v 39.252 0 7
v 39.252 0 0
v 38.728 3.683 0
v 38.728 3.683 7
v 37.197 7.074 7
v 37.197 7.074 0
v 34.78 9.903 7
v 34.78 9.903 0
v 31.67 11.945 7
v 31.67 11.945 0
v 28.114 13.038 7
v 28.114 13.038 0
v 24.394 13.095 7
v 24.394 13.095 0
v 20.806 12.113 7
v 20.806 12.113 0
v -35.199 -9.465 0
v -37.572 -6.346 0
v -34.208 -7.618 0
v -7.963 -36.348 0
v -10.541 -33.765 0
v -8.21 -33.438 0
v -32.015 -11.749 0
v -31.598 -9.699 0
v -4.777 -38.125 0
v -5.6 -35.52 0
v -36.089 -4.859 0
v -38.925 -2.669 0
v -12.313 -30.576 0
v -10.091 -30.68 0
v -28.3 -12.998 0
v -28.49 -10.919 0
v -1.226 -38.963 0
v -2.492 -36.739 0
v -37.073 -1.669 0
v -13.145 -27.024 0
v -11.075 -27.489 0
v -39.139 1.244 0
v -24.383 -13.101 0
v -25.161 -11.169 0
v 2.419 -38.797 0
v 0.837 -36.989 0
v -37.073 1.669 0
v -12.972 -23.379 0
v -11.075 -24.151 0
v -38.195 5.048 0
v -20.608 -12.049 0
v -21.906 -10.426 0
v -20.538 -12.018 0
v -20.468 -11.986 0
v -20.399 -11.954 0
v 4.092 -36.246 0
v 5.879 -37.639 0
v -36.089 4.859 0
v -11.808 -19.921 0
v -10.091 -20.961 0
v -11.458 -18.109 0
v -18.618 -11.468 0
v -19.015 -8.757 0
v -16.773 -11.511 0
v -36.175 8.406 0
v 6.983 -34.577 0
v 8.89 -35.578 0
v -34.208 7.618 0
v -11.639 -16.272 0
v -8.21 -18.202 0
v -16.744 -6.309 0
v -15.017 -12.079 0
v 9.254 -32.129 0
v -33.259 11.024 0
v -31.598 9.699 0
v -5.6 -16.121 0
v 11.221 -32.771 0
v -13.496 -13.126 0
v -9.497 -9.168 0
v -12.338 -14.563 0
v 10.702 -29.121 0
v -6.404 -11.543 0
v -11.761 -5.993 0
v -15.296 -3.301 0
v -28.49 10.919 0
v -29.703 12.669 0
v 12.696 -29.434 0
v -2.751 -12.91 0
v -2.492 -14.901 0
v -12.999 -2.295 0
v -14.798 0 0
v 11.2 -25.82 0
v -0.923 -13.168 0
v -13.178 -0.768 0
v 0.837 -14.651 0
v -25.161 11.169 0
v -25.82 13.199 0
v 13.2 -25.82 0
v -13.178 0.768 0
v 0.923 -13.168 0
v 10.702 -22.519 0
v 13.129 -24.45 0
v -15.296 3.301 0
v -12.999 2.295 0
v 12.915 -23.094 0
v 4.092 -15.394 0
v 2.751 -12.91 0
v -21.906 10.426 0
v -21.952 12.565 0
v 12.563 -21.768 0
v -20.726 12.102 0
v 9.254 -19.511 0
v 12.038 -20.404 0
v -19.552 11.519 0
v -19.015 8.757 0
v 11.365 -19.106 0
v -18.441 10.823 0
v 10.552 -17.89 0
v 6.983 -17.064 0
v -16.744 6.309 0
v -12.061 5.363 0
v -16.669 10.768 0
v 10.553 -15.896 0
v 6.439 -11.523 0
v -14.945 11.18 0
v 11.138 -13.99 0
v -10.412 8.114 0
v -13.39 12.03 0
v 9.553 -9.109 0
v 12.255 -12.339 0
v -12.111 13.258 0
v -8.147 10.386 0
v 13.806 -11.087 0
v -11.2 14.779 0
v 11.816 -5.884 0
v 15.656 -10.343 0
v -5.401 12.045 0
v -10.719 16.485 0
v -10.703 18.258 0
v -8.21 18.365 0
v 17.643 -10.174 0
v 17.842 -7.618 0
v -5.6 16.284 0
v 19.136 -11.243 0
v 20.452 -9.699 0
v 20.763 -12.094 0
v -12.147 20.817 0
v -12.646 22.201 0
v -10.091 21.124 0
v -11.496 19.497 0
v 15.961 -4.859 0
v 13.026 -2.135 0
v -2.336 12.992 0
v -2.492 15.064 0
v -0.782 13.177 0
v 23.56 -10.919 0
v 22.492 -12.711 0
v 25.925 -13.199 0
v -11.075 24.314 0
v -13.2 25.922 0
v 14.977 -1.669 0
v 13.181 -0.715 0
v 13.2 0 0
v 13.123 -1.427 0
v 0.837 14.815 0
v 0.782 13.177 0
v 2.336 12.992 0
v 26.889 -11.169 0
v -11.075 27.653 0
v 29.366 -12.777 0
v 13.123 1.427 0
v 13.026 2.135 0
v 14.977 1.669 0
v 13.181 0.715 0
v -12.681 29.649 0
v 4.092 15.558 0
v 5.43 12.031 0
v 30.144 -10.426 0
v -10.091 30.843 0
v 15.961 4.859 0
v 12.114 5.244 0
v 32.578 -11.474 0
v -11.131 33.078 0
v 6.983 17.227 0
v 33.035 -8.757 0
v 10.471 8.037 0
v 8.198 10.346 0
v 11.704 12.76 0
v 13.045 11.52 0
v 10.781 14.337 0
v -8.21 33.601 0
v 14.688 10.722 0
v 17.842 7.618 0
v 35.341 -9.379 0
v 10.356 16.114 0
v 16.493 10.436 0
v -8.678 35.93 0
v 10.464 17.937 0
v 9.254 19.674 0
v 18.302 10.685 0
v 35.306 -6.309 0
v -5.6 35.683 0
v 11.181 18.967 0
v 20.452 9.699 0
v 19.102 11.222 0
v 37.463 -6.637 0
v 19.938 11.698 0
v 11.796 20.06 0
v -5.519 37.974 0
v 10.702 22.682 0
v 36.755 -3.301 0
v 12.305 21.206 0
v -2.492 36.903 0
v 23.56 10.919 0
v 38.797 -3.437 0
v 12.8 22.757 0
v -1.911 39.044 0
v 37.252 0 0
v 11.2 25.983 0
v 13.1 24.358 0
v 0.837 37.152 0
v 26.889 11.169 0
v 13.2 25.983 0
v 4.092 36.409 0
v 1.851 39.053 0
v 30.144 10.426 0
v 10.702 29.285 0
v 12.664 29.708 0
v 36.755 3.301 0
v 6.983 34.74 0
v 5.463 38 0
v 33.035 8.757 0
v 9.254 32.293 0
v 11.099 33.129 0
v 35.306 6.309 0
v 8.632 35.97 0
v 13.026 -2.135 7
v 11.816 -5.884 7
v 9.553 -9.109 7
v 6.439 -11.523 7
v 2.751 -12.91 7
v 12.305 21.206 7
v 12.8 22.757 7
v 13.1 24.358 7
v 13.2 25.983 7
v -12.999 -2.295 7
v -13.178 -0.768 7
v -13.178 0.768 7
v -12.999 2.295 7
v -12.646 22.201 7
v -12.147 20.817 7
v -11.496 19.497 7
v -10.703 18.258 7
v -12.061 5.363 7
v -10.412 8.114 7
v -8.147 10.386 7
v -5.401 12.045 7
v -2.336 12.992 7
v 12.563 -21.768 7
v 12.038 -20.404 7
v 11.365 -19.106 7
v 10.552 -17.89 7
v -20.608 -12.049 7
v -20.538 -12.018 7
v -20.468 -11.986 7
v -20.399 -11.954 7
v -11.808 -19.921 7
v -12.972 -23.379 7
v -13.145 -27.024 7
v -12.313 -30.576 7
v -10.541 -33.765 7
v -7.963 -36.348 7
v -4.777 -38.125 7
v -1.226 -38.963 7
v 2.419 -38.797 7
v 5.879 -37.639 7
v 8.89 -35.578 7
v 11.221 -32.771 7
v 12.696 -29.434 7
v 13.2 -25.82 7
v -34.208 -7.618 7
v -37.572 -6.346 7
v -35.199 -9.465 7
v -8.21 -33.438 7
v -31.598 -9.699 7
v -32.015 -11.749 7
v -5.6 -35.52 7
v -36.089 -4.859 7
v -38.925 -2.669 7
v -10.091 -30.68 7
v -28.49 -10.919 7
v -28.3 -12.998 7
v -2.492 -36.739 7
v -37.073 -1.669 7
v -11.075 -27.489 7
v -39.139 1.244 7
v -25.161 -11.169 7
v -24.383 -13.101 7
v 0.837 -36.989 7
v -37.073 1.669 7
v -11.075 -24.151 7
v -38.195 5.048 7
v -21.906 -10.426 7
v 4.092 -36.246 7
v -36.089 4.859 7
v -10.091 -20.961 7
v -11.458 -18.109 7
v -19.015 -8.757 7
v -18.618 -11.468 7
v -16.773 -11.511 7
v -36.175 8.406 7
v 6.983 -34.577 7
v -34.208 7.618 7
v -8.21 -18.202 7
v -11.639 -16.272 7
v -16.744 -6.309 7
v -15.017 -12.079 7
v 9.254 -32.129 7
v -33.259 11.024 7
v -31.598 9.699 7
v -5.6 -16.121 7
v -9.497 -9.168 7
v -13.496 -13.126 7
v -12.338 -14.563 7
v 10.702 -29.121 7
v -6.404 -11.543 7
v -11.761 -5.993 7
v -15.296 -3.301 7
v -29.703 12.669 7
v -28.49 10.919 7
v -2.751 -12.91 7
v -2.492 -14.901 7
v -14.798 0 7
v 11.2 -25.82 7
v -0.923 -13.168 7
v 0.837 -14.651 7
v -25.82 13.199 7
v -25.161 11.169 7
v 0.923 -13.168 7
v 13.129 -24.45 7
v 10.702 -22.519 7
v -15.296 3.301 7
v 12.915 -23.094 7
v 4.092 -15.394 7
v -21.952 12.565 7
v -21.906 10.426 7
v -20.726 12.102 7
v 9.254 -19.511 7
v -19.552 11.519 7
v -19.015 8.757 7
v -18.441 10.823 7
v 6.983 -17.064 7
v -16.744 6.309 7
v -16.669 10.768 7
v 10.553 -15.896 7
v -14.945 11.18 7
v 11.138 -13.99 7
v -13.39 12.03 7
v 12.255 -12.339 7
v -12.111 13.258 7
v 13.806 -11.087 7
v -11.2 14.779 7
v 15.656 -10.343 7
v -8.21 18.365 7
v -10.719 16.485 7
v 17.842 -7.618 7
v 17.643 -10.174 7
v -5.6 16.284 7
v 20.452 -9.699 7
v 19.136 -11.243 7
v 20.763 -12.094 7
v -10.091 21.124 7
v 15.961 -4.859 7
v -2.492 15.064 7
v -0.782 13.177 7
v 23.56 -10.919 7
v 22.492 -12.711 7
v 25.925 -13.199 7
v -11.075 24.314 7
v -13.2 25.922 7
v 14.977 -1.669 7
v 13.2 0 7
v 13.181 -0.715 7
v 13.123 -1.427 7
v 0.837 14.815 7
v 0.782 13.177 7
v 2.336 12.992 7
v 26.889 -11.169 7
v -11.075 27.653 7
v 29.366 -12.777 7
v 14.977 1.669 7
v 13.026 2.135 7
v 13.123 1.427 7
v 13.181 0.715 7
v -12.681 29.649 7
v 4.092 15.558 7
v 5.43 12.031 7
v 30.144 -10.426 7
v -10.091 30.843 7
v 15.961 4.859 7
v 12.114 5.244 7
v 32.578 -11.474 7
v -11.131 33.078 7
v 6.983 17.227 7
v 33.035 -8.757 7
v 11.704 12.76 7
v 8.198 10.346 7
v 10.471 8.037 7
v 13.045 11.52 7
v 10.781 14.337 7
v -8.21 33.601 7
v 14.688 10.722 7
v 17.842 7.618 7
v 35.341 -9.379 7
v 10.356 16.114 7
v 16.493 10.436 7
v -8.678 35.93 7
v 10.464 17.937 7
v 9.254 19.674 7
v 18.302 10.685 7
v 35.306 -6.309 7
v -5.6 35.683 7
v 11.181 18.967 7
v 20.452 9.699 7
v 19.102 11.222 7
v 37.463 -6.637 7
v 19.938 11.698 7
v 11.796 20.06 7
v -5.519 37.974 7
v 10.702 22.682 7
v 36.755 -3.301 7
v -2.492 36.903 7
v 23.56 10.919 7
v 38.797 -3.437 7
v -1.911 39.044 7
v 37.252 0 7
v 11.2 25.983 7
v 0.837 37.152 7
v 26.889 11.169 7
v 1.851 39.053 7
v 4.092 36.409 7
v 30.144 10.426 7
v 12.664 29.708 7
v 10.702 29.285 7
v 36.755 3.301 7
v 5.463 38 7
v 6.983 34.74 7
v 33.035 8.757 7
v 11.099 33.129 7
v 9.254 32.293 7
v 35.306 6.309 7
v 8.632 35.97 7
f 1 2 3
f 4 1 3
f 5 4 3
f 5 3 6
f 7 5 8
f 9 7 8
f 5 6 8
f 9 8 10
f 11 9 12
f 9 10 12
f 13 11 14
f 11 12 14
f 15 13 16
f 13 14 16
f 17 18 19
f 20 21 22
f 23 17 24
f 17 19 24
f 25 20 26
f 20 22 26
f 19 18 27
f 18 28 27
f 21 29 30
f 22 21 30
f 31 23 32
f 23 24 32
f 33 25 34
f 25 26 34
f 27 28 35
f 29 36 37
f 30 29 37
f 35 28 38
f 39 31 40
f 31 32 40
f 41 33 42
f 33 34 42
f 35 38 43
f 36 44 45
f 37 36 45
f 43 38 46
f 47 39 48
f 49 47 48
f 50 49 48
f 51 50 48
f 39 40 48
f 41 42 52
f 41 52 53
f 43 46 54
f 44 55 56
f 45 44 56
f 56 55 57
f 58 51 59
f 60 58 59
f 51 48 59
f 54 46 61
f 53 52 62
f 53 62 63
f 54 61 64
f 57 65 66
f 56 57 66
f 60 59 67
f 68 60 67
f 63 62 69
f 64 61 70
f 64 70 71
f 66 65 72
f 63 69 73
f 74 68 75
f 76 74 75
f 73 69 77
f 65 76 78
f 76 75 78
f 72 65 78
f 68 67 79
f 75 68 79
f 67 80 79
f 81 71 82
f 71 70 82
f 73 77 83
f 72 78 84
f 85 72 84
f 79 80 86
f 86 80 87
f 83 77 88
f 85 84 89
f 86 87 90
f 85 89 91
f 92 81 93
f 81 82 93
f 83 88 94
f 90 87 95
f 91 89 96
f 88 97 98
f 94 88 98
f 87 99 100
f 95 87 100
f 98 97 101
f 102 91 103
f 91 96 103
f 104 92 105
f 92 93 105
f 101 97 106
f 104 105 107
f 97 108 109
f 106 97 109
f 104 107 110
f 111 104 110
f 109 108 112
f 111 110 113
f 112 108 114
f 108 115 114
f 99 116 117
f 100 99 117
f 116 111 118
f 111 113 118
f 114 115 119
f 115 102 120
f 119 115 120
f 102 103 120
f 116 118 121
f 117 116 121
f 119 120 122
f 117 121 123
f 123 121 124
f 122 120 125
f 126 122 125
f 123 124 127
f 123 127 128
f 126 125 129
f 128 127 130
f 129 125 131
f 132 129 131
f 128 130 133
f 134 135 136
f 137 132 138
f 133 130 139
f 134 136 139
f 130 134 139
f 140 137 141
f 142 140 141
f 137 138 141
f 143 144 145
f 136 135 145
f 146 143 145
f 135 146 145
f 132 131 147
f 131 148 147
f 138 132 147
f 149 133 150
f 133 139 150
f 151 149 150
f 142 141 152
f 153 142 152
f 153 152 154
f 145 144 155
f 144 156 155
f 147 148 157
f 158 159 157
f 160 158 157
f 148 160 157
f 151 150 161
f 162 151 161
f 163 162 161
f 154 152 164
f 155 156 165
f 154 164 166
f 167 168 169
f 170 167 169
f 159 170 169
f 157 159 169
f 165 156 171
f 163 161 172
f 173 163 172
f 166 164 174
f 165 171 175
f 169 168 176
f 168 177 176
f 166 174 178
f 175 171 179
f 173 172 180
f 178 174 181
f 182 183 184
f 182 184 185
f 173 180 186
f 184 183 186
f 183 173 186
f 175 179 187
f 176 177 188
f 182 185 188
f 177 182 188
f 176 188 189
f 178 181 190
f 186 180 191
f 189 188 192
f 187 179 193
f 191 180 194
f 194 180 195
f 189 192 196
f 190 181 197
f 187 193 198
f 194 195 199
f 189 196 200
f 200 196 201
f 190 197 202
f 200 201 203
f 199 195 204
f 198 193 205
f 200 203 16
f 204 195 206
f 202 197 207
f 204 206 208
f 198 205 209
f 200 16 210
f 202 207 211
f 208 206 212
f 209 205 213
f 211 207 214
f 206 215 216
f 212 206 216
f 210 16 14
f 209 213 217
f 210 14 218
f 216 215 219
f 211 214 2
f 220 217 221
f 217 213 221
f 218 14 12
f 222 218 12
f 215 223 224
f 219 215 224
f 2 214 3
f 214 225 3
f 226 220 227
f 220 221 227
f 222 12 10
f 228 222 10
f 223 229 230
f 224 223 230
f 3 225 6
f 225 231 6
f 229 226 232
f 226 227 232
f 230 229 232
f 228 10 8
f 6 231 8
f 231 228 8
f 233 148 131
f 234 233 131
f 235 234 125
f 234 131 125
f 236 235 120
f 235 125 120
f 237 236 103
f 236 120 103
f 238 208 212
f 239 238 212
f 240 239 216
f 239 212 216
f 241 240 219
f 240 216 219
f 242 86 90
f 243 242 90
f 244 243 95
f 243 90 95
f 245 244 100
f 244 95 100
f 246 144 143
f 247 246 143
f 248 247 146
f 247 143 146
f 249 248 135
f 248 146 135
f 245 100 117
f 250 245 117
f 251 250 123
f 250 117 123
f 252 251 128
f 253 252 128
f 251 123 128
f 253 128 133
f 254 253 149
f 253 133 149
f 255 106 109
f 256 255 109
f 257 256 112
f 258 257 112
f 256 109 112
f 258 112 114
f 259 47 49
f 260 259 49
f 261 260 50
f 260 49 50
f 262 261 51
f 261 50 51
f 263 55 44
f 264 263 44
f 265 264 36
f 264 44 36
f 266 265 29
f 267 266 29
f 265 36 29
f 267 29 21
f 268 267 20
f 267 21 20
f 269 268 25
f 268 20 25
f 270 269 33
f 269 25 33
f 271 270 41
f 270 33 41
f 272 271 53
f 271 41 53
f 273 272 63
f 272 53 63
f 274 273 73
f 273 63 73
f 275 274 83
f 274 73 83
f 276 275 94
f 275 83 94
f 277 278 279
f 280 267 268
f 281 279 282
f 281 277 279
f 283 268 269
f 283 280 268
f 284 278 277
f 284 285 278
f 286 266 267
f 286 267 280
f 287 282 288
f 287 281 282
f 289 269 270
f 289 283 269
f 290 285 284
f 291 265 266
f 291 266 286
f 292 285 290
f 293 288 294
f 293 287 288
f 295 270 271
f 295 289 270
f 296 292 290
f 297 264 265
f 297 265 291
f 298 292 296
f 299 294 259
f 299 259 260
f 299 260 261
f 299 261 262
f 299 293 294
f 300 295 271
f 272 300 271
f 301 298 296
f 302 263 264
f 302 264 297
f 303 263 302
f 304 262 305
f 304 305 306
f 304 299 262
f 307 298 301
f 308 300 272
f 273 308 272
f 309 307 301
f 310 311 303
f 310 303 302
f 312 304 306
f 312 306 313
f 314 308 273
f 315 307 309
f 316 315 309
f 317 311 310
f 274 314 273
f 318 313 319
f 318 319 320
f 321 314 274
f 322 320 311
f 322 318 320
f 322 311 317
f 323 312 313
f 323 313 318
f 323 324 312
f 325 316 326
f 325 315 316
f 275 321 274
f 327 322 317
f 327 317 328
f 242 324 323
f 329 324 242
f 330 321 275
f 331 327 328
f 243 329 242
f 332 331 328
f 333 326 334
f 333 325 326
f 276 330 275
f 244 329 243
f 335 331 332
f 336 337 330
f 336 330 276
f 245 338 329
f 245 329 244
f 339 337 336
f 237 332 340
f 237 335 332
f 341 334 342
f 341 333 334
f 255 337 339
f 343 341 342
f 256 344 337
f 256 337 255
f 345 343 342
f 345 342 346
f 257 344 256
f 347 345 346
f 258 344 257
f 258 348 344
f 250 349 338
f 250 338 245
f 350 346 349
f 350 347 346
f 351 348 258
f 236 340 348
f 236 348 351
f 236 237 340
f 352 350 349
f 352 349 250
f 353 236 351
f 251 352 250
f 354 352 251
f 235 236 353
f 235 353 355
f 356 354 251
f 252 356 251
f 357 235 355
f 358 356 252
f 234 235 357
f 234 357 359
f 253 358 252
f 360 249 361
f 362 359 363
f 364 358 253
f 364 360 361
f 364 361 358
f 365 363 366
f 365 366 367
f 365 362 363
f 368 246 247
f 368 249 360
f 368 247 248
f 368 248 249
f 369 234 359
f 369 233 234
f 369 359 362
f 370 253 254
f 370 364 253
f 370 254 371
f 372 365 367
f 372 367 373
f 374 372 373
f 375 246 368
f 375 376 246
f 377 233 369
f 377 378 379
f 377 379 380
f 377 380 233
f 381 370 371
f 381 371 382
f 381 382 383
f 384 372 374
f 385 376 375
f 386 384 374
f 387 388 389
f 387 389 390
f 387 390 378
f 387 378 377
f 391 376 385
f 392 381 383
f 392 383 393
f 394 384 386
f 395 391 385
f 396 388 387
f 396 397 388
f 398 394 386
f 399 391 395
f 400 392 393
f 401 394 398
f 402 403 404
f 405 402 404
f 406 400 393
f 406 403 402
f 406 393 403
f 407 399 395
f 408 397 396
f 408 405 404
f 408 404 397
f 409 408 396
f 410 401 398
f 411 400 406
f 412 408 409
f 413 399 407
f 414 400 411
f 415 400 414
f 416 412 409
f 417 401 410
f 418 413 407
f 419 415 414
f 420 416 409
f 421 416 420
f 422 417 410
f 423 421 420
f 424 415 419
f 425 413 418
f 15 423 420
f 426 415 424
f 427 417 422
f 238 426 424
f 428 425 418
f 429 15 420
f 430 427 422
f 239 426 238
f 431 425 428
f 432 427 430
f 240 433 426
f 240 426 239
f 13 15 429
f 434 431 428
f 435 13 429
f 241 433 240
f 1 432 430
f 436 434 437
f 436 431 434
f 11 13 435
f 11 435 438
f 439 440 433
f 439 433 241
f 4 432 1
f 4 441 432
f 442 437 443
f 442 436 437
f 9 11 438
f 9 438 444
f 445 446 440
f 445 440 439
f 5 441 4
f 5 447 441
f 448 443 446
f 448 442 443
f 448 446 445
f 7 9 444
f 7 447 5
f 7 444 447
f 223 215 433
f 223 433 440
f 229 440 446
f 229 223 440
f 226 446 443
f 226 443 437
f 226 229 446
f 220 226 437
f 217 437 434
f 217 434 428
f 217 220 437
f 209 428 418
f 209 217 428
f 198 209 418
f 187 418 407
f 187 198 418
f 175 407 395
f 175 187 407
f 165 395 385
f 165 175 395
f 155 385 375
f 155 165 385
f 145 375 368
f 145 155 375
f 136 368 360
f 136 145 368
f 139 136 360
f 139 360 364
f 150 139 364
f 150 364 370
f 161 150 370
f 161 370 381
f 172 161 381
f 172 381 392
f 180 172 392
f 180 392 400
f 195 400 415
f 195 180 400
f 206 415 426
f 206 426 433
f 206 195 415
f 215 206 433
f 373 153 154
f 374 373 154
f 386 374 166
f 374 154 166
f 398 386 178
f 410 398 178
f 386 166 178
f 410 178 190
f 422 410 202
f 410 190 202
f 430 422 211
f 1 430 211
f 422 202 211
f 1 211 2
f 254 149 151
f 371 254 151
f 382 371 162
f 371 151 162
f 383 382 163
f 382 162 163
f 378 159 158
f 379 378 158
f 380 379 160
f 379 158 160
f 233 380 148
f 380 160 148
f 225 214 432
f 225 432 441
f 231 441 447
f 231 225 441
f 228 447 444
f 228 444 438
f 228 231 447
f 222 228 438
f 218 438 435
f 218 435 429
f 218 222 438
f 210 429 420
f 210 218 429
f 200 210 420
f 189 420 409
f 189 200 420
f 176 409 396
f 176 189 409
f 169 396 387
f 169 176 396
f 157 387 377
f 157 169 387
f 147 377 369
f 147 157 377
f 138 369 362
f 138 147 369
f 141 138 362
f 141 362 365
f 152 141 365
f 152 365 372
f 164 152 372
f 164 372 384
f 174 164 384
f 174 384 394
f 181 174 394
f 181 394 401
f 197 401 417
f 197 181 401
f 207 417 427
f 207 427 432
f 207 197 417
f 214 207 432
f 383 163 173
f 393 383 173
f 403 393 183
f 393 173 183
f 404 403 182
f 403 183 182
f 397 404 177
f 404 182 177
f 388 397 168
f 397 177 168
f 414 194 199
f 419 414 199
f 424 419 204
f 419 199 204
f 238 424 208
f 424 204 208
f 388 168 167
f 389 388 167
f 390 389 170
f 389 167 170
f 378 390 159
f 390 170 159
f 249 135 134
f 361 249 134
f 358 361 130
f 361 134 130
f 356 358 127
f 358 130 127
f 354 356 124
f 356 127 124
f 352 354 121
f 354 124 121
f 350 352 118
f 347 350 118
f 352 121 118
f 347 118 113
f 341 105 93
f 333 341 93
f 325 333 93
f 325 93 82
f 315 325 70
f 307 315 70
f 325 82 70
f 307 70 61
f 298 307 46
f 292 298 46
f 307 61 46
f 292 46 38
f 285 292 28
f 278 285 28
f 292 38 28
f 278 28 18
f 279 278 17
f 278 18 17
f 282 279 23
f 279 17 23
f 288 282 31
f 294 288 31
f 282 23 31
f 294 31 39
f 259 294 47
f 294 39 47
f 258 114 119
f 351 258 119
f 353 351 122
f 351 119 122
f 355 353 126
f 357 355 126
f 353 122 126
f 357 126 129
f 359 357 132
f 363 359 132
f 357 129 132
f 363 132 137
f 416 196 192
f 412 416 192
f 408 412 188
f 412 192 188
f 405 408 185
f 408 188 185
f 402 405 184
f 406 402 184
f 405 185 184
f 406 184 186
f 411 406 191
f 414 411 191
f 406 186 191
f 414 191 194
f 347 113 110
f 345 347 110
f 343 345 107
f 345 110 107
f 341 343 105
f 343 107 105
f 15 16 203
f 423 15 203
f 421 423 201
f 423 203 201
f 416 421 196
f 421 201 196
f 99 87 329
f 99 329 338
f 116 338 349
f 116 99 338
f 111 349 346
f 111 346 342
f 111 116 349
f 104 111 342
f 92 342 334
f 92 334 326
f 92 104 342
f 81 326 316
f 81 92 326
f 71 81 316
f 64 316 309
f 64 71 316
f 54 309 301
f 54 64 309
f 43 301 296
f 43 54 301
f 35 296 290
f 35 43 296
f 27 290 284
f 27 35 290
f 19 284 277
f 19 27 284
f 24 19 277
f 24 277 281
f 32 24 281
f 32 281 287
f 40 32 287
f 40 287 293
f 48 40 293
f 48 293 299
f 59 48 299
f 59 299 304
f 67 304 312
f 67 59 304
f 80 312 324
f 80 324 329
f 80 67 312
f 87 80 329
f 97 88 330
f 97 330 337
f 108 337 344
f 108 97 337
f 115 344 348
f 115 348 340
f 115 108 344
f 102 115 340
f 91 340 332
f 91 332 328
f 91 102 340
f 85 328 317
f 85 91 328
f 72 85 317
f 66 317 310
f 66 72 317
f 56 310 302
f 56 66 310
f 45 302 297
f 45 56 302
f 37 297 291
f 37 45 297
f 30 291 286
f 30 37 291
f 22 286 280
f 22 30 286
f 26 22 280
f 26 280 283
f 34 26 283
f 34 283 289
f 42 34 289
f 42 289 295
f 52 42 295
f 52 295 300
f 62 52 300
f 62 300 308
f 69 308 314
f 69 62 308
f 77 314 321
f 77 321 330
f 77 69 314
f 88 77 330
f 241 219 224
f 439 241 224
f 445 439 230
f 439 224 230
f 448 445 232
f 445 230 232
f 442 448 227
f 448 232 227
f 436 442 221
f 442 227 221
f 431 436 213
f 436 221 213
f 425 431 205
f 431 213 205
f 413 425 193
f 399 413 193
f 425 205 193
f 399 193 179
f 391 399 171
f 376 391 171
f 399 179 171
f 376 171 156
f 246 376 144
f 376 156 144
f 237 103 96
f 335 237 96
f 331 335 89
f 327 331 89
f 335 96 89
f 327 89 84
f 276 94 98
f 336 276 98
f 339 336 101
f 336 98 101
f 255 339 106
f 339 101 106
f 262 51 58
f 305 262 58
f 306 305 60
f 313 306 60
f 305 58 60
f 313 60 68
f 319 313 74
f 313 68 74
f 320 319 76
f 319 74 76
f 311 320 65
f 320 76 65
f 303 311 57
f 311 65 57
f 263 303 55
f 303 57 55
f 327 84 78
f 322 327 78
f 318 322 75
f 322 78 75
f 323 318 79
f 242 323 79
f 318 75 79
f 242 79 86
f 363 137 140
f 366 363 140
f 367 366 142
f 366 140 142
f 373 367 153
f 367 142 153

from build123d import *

# Parameters (mm, degrees)
F0_R     = 11.2
F1_DEPTH = 7


with BuildPart() as f1:
    # F0 (on Top) → F1 (new body)
    with BuildSketch(Plane.XY):
        with BuildLine():
            ThreePointArc((13.026173, 2.135137), (13.156472, 1.071101), (13.2, 0))
            ThreePointArc((13.2, 0), (13.156472, -1.071101), (13.026173, -2.135137))
            ThreePointArc((13.026173, -2.135137), (14.605448, -6.573318), (17.642623, -10.174308))
            ThreePointArc((17.642623, -10.174308), (20.336655, -10.92785), (22.492241, -12.710848))
            ThreePointArc((22.492241, -12.710848), (34.028768, -10.517447), (39.252346, 0))
            ThreePointArc((39.252346, 0), (33.297709, 11.033799), (20.806177, 12.112708))
            ThreePointArc((20.806177, 12.112708), (19.638047, 11.252162), (18.302422, 10.685442))
            ThreePointArc((18.302422, 10.685442), (14.818981, 6.93192), (13.026173, 2.135137))
        make_face()
        with Locations((26.052346, 0)):
            Circle(F0_R, mode=Mode.SUBTRACT)
        with BuildLine():
            ThreePointArc((2.335909, 12.991671), (9.405556, 9.261507), (13.026173, 2.135137))
            ThreePointArc((13.026173, 2.135137), (14.818981, 6.93192), (18.302422, 10.685442))
            ThreePointArc((18.302422, 10.685442), (12.328836, 12.090695), (10.464205, 17.9372))
            ThreePointArc((10.464205, 17.9372), (6.861144, 14.70661), (2.335909, 12.991671))
        make_face()
        with BuildLine():
            ThreePointArc((17.642623, -10.174308), (14.605448, -6.573318), (13.026173, -2.135137))
            ThreePointArc((13.026173, -2.135137), (9.552918, -9.109432), (2.751477, -12.910049))
            ThreePointArc((2.751477, -12.910049), (7.102679, -14.693916), (10.552385, -17.889956))
            ThreePointArc((10.552385, -17.889956), (12.254899, -12.338884), (17.642623, -10.174308))
        make_face()
        with BuildLine():
            ThreePointArc((-2.335909, 12.991671), (0, 13.2), (2.335909, 12.991671))
            ThreePointArc((2.335909, 12.991671), (6.861144, 14.70661), (10.464205, 17.9372))
            ThreePointArc((10.464205, 17.9372), (11.132538, 19.713613), (12.305166, 21.206013))
            ThreePointArc((12.305166, 21.206013), (12.974363, 23.553137), (13.2, 25.983343))
            ThreePointArc((13.2, 25.983343), (-1.911461, 39.044213), (-12.646411, 22.200715))
            ThreePointArc((-12.646411, 22.200715), (-11.342134, 20.393236), (-10.703132, 18.257868))
            ThreePointArc((-10.703132, 18.257868), (-7.03117, 14.811833), (-2.335909, 12.991671))
        make_face()
        with Locations((0, 25.983343)):
            Circle(F0_R, mode=Mode.SUBTRACT)
        with BuildLine():
            ThreePointArc((20.806177, 12.112708), (19.51523, 11.467611), (18.302422, 10.685442))
            ThreePointArc((18.302422, 10.685442), (19.638047, 11.252162), (20.806177, 12.112708))
        make_face()
        with BuildLine():
            ThreePointArc((10.552385, -17.889956), (7.102679, -14.693916), (2.751477, -12.910049))
            ThreePointArc((2.751477, -12.910049), (0, -13.2), (-2.751477, -12.910049))
            ThreePointArc((-2.751477, -12.910049), (-8.080001, -15.382016), (-11.808487, -19.920978))
            ThreePointArc((-11.808487, -19.920978), (-3.030509, -38.667512), (13.2, -25.820099))
            ThreePointArc((13.2, -25.820099), (13.039715, -23.769289), (12.562754, -21.768284))
            ThreePointArc((12.562754, -21.768284), (11.234444, -19.996615), (10.552385, -17.889956))
        make_face()
        with Locations((0, -25.820099)):
            Circle(F0_R, mode=Mode.SUBTRACT)
        with BuildLine():
            ThreePointArc((22.492241, -12.710848), (20.336655, -10.92785), (17.642623, -10.174308))
            ThreePointArc((17.642623, -10.174308), (19.934527, -11.696679), (22.492241, -12.710848))
        make_face()
        with BuildLine():
            ThreePointArc((-12.998967, 2.294961), (-9.348503, 9.319092), (-2.335909, 12.991671))
            ThreePointArc((-2.335909, 12.991671), (-7.03117, 14.811833), (-10.703132, 18.257868))
            ThreePointArc((-10.703132, 18.257868), (-12.70956, 12.601772), (-18.441334, 10.823021))
            ThreePointArc((-18.441334, 10.823021), (-14.870725, 7.10107), (-12.998967, 2.294961))
        make_face()
        with BuildLine():
            ThreePointArc((12.305166, 21.206013), (11.132538, 19.713613), (10.464205, 17.9372))
            ThreePointArc((10.464205, 17.9372), (11.501406, 19.50587), (12.305166, 21.206013))
        make_face()
        with BuildLine():
            ThreePointArc((-11.808487, -19.920978), (-8.080001, -15.382016), (-2.751477, -12.910049))
            ThreePointArc((-2.751477, -12.910049), (-9.496797, -9.167925), (-12.998967, -2.294961))
            ThreePointArc((-12.998967, -2.294961), (-15.519744, -8.027921), (-20.399145, -11.953809))
            ThreePointArc((-20.399145, -11.953809), (-13.49629, -13.12581), (-11.808487, -19.920978))
        make_face()
        with BuildLine():
            ThreePointArc((12.562754, -21.768284), (11.71912, -19.745379), (10.552385, -17.889956))
            ThreePointArc((10.552385, -17.889956), (11.234444, -19.996615), (12.562754, -21.768284))
        make_face()
        with BuildLine():
            ThreePointArc((-12.998967, -2.294961), (-13.2, 0), (-12.998967, 2.294961))
            ThreePointArc((-12.998967, 2.294961), (-14.870725, 7.10107), (-18.441334, 10.823021))
            ThreePointArc((-18.441334, 10.823021), (-20.327157, 11.431359), (-21.952488, 12.564807))
            ThreePointArc((-21.952488, 12.564807), (-39.178277, -0.720131), (-20.607655, -12.049269))
            ThreePointArc((-20.607655, -12.049269), (-20.503828, -12.000604), (-20.399145, -11.953809))
            ThreePointArc((-20.399145, -11.953809), (-15.519744, -8.027921), (-12.998967, -2.294961))
        make_face()
        with Locations((-25.997935, 0)):
            Circle(F0_R, mode=Mode.SUBTRACT)
        with BuildLine():
            ThreePointArc((-12.646411, 22.200715), (-11.840051, 20.147831), (-10.703132, 18.257868))
            ThreePointArc((-10.703132, 18.257868), (-11.342134, 20.393236), (-12.646411, 22.200715))
        make_face()
        with BuildLine():
            ThreePointArc((-21.952488, 12.564807), (-20.327157, 11.431359), (-18.441334, 10.823021))
            ThreePointArc((-18.441334, 10.823021), (-20.131903, 11.82496), (-21.952488, 12.564807))
        make_face()
        with BuildLine():
            ThreePointArc((-20.607655, -12.049269), (-20.503193, -12.001992), (-20.399145, -11.953809))
            ThreePointArc((-20.399145, -11.953809), (-20.503828, -12.000604), (-20.607655, -12.049269))
        make_face()
    extrude(amount=F1_DEPTH)


solid = f1.part
